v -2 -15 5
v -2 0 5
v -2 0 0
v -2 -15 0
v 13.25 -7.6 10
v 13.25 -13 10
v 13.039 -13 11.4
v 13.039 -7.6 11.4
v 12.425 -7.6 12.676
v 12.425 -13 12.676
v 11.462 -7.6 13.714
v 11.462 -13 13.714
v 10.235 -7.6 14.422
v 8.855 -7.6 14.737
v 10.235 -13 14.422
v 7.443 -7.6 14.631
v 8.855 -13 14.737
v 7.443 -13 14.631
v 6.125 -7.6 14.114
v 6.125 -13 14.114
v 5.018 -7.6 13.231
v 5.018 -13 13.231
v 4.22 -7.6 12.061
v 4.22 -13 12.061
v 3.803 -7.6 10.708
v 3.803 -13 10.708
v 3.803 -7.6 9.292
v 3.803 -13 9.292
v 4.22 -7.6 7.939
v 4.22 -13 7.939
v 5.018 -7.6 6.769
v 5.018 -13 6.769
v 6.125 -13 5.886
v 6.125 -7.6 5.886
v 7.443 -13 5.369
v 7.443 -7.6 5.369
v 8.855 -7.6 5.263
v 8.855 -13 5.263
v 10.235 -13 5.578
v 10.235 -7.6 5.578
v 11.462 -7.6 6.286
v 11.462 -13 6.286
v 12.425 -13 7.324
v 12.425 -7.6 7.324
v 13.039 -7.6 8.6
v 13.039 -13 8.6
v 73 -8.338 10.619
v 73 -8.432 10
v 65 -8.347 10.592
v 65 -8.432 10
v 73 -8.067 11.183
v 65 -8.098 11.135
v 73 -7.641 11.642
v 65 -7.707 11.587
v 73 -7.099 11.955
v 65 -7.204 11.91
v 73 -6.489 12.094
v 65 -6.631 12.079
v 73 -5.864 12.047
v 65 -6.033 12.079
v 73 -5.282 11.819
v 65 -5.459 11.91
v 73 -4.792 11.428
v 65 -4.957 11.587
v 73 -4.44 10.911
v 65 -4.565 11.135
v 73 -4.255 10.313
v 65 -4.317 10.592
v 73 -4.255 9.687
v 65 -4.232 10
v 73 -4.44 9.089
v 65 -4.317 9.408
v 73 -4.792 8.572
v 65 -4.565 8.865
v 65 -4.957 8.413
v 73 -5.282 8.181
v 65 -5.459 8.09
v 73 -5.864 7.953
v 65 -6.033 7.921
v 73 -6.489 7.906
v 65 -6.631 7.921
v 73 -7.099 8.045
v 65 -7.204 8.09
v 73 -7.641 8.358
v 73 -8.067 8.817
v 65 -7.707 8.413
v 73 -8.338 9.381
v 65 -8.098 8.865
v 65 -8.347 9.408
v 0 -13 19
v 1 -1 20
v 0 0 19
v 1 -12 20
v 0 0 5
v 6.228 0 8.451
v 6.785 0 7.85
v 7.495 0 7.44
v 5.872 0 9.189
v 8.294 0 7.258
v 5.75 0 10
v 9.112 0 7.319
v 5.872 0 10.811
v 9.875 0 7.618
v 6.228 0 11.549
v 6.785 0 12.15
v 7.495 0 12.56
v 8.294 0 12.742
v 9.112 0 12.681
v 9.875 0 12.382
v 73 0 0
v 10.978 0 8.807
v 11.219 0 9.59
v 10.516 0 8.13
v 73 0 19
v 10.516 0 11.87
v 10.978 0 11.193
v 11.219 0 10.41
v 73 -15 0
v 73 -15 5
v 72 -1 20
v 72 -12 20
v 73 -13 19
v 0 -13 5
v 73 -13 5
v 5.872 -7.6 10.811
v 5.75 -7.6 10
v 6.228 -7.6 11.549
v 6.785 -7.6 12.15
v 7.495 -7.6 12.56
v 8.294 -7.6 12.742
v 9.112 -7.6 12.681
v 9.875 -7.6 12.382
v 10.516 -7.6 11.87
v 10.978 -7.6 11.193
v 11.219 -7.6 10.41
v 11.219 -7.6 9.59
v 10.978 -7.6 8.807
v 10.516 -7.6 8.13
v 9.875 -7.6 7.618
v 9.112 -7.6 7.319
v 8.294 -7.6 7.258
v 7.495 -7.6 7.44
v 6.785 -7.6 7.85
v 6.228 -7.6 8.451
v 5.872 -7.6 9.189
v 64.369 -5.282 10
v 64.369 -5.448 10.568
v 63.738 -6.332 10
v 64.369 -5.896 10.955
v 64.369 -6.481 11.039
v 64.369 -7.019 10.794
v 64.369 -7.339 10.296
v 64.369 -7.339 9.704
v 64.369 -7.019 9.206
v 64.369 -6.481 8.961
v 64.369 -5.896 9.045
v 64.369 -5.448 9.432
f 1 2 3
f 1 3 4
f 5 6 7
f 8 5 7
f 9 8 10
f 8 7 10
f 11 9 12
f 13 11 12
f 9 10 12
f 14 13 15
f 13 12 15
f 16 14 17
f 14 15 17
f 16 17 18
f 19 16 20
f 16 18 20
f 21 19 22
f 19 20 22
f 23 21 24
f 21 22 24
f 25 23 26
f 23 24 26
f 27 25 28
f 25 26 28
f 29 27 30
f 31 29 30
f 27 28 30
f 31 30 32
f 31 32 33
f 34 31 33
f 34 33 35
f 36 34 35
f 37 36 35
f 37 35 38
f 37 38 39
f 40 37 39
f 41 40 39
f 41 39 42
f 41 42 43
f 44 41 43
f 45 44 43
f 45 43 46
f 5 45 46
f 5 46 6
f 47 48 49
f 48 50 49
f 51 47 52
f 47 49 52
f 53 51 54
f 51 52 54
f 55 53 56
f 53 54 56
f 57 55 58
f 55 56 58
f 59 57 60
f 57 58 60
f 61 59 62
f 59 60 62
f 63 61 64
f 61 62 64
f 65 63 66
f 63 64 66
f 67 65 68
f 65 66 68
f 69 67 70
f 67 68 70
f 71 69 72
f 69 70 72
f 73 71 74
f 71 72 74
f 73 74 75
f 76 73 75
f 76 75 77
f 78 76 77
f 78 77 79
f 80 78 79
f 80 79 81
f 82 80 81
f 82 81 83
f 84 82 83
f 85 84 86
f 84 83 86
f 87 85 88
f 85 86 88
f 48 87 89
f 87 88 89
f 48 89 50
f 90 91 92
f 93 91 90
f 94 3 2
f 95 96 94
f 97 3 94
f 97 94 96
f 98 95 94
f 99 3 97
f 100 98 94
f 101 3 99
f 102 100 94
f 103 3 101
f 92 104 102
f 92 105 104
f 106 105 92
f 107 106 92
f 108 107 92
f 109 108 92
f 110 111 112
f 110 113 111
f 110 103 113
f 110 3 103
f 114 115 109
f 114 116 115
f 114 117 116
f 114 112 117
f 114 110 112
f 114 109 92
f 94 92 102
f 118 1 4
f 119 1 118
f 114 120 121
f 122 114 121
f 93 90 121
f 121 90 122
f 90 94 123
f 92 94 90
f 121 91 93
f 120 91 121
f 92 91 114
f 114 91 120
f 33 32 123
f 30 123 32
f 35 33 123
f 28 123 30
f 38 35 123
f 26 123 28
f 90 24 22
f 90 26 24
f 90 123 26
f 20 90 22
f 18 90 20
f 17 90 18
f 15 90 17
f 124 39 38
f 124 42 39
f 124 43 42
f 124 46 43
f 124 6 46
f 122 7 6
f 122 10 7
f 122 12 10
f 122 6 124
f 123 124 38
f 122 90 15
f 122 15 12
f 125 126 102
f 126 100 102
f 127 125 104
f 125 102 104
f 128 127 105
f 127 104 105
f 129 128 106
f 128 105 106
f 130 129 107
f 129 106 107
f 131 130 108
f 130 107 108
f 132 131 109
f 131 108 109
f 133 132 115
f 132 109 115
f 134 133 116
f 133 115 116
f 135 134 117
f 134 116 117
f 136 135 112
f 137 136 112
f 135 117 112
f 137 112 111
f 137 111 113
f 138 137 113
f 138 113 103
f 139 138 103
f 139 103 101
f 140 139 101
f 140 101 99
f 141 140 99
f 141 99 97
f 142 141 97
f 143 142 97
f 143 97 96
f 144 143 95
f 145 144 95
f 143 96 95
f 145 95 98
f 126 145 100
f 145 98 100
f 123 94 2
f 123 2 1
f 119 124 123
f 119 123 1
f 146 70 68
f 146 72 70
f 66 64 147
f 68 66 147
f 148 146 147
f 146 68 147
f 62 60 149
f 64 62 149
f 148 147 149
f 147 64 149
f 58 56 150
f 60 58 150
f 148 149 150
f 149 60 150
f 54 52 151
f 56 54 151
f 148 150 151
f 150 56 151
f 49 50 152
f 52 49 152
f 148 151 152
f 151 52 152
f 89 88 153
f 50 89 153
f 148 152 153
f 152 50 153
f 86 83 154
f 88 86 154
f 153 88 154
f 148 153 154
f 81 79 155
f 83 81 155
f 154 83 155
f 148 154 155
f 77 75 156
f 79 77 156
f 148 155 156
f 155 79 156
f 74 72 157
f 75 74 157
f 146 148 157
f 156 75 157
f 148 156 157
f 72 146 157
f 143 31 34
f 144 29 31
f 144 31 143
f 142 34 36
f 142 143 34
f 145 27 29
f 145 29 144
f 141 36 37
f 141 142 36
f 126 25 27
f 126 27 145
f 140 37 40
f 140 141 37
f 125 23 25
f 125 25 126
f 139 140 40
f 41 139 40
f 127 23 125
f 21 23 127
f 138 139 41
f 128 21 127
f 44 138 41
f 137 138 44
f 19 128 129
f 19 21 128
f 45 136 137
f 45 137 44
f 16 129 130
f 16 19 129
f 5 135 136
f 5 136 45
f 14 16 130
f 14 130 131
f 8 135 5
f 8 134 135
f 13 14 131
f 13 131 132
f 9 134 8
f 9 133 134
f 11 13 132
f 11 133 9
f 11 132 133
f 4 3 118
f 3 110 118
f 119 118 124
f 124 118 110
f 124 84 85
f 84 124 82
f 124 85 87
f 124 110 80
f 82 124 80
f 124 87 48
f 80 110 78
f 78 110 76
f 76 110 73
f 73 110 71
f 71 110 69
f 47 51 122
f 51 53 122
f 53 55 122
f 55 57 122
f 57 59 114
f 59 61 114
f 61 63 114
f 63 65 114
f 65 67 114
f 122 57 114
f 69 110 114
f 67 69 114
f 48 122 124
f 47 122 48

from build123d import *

# Parameters (mm, degrees)
F0_W           = 73
F0_H           = 20
F1_DEPTH       = 13
F2_W           = 75
F2_H           = 5
F3_DEPTH       = 2
F4_W           = 13
F4_H           = 5
F5_DEPTH       = 2
F7_D           = 5.5
F7_CBORE_D     = 9.5
F7_CBORE_DEPTH = 5.4
F9_D           = 4.2
F9_DEPTH       = 8
F9_TIP         = 1.2618073
F10_SIZE       = 1


with BuildPart() as f1:
    # F0 (on Front) → F1 (new body)
    with BuildSketch(Plane.XZ):
        with Locations((36.5, 10)):
            Rectangle(F0_W, F0_H)
    extrude(amount=F1_DEPTH)

    # F2 (on face) → F3 (join)
    with BuildSketch(Plane.XZ.offset(13)):
        with Locations((35.5, 2.5)):
            Rectangle(F2_W, F2_H)
    extrude(amount=F3_DEPTH)

    # F4 (on face) → F5 (join)
    with BuildSketch(Plane(origin=(0, 0, 0), x_dir=(0, -1, 0), z_dir=(-1, 0, 0))):
        with Locations((6.5, 2.5)):
            Rectangle(F4_W, F4_H)
    extrude(amount=F5_DEPTH)

    # F7 (through all)
    with Locations(Plane.XZ.offset(13)):
        with Locations((8.5, 10)):
            CounterBoreHole(F7_D / 2, F7_CBORE_D / 2, F7_CBORE_DEPTH)

    # F9
    with Locations(Plane.YZ.offset(73)):
        with Locations((-6.3317259774, 10)):
            Hole(F9_D / 2, depth=F9_DEPTH)
            with Locations((0, 0, -(F9_DEPTH + F9_TIP / 2))):  # 118° drill point
                Cone(0, F9_D / 2, F9_TIP, mode=Mode.SUBTRACT)

    # F10
    f10_edges = [f1.edges().sort_by_distance(p)[0] for p in [
        (36.5, 0, 20),
        (36.5, -13, 20),
        (0, -6.5, 20),
        (73, -6.5, 20),
    ]]
    chamfer(f10_edges, length=F10_SIZE)


solid = f1.part
